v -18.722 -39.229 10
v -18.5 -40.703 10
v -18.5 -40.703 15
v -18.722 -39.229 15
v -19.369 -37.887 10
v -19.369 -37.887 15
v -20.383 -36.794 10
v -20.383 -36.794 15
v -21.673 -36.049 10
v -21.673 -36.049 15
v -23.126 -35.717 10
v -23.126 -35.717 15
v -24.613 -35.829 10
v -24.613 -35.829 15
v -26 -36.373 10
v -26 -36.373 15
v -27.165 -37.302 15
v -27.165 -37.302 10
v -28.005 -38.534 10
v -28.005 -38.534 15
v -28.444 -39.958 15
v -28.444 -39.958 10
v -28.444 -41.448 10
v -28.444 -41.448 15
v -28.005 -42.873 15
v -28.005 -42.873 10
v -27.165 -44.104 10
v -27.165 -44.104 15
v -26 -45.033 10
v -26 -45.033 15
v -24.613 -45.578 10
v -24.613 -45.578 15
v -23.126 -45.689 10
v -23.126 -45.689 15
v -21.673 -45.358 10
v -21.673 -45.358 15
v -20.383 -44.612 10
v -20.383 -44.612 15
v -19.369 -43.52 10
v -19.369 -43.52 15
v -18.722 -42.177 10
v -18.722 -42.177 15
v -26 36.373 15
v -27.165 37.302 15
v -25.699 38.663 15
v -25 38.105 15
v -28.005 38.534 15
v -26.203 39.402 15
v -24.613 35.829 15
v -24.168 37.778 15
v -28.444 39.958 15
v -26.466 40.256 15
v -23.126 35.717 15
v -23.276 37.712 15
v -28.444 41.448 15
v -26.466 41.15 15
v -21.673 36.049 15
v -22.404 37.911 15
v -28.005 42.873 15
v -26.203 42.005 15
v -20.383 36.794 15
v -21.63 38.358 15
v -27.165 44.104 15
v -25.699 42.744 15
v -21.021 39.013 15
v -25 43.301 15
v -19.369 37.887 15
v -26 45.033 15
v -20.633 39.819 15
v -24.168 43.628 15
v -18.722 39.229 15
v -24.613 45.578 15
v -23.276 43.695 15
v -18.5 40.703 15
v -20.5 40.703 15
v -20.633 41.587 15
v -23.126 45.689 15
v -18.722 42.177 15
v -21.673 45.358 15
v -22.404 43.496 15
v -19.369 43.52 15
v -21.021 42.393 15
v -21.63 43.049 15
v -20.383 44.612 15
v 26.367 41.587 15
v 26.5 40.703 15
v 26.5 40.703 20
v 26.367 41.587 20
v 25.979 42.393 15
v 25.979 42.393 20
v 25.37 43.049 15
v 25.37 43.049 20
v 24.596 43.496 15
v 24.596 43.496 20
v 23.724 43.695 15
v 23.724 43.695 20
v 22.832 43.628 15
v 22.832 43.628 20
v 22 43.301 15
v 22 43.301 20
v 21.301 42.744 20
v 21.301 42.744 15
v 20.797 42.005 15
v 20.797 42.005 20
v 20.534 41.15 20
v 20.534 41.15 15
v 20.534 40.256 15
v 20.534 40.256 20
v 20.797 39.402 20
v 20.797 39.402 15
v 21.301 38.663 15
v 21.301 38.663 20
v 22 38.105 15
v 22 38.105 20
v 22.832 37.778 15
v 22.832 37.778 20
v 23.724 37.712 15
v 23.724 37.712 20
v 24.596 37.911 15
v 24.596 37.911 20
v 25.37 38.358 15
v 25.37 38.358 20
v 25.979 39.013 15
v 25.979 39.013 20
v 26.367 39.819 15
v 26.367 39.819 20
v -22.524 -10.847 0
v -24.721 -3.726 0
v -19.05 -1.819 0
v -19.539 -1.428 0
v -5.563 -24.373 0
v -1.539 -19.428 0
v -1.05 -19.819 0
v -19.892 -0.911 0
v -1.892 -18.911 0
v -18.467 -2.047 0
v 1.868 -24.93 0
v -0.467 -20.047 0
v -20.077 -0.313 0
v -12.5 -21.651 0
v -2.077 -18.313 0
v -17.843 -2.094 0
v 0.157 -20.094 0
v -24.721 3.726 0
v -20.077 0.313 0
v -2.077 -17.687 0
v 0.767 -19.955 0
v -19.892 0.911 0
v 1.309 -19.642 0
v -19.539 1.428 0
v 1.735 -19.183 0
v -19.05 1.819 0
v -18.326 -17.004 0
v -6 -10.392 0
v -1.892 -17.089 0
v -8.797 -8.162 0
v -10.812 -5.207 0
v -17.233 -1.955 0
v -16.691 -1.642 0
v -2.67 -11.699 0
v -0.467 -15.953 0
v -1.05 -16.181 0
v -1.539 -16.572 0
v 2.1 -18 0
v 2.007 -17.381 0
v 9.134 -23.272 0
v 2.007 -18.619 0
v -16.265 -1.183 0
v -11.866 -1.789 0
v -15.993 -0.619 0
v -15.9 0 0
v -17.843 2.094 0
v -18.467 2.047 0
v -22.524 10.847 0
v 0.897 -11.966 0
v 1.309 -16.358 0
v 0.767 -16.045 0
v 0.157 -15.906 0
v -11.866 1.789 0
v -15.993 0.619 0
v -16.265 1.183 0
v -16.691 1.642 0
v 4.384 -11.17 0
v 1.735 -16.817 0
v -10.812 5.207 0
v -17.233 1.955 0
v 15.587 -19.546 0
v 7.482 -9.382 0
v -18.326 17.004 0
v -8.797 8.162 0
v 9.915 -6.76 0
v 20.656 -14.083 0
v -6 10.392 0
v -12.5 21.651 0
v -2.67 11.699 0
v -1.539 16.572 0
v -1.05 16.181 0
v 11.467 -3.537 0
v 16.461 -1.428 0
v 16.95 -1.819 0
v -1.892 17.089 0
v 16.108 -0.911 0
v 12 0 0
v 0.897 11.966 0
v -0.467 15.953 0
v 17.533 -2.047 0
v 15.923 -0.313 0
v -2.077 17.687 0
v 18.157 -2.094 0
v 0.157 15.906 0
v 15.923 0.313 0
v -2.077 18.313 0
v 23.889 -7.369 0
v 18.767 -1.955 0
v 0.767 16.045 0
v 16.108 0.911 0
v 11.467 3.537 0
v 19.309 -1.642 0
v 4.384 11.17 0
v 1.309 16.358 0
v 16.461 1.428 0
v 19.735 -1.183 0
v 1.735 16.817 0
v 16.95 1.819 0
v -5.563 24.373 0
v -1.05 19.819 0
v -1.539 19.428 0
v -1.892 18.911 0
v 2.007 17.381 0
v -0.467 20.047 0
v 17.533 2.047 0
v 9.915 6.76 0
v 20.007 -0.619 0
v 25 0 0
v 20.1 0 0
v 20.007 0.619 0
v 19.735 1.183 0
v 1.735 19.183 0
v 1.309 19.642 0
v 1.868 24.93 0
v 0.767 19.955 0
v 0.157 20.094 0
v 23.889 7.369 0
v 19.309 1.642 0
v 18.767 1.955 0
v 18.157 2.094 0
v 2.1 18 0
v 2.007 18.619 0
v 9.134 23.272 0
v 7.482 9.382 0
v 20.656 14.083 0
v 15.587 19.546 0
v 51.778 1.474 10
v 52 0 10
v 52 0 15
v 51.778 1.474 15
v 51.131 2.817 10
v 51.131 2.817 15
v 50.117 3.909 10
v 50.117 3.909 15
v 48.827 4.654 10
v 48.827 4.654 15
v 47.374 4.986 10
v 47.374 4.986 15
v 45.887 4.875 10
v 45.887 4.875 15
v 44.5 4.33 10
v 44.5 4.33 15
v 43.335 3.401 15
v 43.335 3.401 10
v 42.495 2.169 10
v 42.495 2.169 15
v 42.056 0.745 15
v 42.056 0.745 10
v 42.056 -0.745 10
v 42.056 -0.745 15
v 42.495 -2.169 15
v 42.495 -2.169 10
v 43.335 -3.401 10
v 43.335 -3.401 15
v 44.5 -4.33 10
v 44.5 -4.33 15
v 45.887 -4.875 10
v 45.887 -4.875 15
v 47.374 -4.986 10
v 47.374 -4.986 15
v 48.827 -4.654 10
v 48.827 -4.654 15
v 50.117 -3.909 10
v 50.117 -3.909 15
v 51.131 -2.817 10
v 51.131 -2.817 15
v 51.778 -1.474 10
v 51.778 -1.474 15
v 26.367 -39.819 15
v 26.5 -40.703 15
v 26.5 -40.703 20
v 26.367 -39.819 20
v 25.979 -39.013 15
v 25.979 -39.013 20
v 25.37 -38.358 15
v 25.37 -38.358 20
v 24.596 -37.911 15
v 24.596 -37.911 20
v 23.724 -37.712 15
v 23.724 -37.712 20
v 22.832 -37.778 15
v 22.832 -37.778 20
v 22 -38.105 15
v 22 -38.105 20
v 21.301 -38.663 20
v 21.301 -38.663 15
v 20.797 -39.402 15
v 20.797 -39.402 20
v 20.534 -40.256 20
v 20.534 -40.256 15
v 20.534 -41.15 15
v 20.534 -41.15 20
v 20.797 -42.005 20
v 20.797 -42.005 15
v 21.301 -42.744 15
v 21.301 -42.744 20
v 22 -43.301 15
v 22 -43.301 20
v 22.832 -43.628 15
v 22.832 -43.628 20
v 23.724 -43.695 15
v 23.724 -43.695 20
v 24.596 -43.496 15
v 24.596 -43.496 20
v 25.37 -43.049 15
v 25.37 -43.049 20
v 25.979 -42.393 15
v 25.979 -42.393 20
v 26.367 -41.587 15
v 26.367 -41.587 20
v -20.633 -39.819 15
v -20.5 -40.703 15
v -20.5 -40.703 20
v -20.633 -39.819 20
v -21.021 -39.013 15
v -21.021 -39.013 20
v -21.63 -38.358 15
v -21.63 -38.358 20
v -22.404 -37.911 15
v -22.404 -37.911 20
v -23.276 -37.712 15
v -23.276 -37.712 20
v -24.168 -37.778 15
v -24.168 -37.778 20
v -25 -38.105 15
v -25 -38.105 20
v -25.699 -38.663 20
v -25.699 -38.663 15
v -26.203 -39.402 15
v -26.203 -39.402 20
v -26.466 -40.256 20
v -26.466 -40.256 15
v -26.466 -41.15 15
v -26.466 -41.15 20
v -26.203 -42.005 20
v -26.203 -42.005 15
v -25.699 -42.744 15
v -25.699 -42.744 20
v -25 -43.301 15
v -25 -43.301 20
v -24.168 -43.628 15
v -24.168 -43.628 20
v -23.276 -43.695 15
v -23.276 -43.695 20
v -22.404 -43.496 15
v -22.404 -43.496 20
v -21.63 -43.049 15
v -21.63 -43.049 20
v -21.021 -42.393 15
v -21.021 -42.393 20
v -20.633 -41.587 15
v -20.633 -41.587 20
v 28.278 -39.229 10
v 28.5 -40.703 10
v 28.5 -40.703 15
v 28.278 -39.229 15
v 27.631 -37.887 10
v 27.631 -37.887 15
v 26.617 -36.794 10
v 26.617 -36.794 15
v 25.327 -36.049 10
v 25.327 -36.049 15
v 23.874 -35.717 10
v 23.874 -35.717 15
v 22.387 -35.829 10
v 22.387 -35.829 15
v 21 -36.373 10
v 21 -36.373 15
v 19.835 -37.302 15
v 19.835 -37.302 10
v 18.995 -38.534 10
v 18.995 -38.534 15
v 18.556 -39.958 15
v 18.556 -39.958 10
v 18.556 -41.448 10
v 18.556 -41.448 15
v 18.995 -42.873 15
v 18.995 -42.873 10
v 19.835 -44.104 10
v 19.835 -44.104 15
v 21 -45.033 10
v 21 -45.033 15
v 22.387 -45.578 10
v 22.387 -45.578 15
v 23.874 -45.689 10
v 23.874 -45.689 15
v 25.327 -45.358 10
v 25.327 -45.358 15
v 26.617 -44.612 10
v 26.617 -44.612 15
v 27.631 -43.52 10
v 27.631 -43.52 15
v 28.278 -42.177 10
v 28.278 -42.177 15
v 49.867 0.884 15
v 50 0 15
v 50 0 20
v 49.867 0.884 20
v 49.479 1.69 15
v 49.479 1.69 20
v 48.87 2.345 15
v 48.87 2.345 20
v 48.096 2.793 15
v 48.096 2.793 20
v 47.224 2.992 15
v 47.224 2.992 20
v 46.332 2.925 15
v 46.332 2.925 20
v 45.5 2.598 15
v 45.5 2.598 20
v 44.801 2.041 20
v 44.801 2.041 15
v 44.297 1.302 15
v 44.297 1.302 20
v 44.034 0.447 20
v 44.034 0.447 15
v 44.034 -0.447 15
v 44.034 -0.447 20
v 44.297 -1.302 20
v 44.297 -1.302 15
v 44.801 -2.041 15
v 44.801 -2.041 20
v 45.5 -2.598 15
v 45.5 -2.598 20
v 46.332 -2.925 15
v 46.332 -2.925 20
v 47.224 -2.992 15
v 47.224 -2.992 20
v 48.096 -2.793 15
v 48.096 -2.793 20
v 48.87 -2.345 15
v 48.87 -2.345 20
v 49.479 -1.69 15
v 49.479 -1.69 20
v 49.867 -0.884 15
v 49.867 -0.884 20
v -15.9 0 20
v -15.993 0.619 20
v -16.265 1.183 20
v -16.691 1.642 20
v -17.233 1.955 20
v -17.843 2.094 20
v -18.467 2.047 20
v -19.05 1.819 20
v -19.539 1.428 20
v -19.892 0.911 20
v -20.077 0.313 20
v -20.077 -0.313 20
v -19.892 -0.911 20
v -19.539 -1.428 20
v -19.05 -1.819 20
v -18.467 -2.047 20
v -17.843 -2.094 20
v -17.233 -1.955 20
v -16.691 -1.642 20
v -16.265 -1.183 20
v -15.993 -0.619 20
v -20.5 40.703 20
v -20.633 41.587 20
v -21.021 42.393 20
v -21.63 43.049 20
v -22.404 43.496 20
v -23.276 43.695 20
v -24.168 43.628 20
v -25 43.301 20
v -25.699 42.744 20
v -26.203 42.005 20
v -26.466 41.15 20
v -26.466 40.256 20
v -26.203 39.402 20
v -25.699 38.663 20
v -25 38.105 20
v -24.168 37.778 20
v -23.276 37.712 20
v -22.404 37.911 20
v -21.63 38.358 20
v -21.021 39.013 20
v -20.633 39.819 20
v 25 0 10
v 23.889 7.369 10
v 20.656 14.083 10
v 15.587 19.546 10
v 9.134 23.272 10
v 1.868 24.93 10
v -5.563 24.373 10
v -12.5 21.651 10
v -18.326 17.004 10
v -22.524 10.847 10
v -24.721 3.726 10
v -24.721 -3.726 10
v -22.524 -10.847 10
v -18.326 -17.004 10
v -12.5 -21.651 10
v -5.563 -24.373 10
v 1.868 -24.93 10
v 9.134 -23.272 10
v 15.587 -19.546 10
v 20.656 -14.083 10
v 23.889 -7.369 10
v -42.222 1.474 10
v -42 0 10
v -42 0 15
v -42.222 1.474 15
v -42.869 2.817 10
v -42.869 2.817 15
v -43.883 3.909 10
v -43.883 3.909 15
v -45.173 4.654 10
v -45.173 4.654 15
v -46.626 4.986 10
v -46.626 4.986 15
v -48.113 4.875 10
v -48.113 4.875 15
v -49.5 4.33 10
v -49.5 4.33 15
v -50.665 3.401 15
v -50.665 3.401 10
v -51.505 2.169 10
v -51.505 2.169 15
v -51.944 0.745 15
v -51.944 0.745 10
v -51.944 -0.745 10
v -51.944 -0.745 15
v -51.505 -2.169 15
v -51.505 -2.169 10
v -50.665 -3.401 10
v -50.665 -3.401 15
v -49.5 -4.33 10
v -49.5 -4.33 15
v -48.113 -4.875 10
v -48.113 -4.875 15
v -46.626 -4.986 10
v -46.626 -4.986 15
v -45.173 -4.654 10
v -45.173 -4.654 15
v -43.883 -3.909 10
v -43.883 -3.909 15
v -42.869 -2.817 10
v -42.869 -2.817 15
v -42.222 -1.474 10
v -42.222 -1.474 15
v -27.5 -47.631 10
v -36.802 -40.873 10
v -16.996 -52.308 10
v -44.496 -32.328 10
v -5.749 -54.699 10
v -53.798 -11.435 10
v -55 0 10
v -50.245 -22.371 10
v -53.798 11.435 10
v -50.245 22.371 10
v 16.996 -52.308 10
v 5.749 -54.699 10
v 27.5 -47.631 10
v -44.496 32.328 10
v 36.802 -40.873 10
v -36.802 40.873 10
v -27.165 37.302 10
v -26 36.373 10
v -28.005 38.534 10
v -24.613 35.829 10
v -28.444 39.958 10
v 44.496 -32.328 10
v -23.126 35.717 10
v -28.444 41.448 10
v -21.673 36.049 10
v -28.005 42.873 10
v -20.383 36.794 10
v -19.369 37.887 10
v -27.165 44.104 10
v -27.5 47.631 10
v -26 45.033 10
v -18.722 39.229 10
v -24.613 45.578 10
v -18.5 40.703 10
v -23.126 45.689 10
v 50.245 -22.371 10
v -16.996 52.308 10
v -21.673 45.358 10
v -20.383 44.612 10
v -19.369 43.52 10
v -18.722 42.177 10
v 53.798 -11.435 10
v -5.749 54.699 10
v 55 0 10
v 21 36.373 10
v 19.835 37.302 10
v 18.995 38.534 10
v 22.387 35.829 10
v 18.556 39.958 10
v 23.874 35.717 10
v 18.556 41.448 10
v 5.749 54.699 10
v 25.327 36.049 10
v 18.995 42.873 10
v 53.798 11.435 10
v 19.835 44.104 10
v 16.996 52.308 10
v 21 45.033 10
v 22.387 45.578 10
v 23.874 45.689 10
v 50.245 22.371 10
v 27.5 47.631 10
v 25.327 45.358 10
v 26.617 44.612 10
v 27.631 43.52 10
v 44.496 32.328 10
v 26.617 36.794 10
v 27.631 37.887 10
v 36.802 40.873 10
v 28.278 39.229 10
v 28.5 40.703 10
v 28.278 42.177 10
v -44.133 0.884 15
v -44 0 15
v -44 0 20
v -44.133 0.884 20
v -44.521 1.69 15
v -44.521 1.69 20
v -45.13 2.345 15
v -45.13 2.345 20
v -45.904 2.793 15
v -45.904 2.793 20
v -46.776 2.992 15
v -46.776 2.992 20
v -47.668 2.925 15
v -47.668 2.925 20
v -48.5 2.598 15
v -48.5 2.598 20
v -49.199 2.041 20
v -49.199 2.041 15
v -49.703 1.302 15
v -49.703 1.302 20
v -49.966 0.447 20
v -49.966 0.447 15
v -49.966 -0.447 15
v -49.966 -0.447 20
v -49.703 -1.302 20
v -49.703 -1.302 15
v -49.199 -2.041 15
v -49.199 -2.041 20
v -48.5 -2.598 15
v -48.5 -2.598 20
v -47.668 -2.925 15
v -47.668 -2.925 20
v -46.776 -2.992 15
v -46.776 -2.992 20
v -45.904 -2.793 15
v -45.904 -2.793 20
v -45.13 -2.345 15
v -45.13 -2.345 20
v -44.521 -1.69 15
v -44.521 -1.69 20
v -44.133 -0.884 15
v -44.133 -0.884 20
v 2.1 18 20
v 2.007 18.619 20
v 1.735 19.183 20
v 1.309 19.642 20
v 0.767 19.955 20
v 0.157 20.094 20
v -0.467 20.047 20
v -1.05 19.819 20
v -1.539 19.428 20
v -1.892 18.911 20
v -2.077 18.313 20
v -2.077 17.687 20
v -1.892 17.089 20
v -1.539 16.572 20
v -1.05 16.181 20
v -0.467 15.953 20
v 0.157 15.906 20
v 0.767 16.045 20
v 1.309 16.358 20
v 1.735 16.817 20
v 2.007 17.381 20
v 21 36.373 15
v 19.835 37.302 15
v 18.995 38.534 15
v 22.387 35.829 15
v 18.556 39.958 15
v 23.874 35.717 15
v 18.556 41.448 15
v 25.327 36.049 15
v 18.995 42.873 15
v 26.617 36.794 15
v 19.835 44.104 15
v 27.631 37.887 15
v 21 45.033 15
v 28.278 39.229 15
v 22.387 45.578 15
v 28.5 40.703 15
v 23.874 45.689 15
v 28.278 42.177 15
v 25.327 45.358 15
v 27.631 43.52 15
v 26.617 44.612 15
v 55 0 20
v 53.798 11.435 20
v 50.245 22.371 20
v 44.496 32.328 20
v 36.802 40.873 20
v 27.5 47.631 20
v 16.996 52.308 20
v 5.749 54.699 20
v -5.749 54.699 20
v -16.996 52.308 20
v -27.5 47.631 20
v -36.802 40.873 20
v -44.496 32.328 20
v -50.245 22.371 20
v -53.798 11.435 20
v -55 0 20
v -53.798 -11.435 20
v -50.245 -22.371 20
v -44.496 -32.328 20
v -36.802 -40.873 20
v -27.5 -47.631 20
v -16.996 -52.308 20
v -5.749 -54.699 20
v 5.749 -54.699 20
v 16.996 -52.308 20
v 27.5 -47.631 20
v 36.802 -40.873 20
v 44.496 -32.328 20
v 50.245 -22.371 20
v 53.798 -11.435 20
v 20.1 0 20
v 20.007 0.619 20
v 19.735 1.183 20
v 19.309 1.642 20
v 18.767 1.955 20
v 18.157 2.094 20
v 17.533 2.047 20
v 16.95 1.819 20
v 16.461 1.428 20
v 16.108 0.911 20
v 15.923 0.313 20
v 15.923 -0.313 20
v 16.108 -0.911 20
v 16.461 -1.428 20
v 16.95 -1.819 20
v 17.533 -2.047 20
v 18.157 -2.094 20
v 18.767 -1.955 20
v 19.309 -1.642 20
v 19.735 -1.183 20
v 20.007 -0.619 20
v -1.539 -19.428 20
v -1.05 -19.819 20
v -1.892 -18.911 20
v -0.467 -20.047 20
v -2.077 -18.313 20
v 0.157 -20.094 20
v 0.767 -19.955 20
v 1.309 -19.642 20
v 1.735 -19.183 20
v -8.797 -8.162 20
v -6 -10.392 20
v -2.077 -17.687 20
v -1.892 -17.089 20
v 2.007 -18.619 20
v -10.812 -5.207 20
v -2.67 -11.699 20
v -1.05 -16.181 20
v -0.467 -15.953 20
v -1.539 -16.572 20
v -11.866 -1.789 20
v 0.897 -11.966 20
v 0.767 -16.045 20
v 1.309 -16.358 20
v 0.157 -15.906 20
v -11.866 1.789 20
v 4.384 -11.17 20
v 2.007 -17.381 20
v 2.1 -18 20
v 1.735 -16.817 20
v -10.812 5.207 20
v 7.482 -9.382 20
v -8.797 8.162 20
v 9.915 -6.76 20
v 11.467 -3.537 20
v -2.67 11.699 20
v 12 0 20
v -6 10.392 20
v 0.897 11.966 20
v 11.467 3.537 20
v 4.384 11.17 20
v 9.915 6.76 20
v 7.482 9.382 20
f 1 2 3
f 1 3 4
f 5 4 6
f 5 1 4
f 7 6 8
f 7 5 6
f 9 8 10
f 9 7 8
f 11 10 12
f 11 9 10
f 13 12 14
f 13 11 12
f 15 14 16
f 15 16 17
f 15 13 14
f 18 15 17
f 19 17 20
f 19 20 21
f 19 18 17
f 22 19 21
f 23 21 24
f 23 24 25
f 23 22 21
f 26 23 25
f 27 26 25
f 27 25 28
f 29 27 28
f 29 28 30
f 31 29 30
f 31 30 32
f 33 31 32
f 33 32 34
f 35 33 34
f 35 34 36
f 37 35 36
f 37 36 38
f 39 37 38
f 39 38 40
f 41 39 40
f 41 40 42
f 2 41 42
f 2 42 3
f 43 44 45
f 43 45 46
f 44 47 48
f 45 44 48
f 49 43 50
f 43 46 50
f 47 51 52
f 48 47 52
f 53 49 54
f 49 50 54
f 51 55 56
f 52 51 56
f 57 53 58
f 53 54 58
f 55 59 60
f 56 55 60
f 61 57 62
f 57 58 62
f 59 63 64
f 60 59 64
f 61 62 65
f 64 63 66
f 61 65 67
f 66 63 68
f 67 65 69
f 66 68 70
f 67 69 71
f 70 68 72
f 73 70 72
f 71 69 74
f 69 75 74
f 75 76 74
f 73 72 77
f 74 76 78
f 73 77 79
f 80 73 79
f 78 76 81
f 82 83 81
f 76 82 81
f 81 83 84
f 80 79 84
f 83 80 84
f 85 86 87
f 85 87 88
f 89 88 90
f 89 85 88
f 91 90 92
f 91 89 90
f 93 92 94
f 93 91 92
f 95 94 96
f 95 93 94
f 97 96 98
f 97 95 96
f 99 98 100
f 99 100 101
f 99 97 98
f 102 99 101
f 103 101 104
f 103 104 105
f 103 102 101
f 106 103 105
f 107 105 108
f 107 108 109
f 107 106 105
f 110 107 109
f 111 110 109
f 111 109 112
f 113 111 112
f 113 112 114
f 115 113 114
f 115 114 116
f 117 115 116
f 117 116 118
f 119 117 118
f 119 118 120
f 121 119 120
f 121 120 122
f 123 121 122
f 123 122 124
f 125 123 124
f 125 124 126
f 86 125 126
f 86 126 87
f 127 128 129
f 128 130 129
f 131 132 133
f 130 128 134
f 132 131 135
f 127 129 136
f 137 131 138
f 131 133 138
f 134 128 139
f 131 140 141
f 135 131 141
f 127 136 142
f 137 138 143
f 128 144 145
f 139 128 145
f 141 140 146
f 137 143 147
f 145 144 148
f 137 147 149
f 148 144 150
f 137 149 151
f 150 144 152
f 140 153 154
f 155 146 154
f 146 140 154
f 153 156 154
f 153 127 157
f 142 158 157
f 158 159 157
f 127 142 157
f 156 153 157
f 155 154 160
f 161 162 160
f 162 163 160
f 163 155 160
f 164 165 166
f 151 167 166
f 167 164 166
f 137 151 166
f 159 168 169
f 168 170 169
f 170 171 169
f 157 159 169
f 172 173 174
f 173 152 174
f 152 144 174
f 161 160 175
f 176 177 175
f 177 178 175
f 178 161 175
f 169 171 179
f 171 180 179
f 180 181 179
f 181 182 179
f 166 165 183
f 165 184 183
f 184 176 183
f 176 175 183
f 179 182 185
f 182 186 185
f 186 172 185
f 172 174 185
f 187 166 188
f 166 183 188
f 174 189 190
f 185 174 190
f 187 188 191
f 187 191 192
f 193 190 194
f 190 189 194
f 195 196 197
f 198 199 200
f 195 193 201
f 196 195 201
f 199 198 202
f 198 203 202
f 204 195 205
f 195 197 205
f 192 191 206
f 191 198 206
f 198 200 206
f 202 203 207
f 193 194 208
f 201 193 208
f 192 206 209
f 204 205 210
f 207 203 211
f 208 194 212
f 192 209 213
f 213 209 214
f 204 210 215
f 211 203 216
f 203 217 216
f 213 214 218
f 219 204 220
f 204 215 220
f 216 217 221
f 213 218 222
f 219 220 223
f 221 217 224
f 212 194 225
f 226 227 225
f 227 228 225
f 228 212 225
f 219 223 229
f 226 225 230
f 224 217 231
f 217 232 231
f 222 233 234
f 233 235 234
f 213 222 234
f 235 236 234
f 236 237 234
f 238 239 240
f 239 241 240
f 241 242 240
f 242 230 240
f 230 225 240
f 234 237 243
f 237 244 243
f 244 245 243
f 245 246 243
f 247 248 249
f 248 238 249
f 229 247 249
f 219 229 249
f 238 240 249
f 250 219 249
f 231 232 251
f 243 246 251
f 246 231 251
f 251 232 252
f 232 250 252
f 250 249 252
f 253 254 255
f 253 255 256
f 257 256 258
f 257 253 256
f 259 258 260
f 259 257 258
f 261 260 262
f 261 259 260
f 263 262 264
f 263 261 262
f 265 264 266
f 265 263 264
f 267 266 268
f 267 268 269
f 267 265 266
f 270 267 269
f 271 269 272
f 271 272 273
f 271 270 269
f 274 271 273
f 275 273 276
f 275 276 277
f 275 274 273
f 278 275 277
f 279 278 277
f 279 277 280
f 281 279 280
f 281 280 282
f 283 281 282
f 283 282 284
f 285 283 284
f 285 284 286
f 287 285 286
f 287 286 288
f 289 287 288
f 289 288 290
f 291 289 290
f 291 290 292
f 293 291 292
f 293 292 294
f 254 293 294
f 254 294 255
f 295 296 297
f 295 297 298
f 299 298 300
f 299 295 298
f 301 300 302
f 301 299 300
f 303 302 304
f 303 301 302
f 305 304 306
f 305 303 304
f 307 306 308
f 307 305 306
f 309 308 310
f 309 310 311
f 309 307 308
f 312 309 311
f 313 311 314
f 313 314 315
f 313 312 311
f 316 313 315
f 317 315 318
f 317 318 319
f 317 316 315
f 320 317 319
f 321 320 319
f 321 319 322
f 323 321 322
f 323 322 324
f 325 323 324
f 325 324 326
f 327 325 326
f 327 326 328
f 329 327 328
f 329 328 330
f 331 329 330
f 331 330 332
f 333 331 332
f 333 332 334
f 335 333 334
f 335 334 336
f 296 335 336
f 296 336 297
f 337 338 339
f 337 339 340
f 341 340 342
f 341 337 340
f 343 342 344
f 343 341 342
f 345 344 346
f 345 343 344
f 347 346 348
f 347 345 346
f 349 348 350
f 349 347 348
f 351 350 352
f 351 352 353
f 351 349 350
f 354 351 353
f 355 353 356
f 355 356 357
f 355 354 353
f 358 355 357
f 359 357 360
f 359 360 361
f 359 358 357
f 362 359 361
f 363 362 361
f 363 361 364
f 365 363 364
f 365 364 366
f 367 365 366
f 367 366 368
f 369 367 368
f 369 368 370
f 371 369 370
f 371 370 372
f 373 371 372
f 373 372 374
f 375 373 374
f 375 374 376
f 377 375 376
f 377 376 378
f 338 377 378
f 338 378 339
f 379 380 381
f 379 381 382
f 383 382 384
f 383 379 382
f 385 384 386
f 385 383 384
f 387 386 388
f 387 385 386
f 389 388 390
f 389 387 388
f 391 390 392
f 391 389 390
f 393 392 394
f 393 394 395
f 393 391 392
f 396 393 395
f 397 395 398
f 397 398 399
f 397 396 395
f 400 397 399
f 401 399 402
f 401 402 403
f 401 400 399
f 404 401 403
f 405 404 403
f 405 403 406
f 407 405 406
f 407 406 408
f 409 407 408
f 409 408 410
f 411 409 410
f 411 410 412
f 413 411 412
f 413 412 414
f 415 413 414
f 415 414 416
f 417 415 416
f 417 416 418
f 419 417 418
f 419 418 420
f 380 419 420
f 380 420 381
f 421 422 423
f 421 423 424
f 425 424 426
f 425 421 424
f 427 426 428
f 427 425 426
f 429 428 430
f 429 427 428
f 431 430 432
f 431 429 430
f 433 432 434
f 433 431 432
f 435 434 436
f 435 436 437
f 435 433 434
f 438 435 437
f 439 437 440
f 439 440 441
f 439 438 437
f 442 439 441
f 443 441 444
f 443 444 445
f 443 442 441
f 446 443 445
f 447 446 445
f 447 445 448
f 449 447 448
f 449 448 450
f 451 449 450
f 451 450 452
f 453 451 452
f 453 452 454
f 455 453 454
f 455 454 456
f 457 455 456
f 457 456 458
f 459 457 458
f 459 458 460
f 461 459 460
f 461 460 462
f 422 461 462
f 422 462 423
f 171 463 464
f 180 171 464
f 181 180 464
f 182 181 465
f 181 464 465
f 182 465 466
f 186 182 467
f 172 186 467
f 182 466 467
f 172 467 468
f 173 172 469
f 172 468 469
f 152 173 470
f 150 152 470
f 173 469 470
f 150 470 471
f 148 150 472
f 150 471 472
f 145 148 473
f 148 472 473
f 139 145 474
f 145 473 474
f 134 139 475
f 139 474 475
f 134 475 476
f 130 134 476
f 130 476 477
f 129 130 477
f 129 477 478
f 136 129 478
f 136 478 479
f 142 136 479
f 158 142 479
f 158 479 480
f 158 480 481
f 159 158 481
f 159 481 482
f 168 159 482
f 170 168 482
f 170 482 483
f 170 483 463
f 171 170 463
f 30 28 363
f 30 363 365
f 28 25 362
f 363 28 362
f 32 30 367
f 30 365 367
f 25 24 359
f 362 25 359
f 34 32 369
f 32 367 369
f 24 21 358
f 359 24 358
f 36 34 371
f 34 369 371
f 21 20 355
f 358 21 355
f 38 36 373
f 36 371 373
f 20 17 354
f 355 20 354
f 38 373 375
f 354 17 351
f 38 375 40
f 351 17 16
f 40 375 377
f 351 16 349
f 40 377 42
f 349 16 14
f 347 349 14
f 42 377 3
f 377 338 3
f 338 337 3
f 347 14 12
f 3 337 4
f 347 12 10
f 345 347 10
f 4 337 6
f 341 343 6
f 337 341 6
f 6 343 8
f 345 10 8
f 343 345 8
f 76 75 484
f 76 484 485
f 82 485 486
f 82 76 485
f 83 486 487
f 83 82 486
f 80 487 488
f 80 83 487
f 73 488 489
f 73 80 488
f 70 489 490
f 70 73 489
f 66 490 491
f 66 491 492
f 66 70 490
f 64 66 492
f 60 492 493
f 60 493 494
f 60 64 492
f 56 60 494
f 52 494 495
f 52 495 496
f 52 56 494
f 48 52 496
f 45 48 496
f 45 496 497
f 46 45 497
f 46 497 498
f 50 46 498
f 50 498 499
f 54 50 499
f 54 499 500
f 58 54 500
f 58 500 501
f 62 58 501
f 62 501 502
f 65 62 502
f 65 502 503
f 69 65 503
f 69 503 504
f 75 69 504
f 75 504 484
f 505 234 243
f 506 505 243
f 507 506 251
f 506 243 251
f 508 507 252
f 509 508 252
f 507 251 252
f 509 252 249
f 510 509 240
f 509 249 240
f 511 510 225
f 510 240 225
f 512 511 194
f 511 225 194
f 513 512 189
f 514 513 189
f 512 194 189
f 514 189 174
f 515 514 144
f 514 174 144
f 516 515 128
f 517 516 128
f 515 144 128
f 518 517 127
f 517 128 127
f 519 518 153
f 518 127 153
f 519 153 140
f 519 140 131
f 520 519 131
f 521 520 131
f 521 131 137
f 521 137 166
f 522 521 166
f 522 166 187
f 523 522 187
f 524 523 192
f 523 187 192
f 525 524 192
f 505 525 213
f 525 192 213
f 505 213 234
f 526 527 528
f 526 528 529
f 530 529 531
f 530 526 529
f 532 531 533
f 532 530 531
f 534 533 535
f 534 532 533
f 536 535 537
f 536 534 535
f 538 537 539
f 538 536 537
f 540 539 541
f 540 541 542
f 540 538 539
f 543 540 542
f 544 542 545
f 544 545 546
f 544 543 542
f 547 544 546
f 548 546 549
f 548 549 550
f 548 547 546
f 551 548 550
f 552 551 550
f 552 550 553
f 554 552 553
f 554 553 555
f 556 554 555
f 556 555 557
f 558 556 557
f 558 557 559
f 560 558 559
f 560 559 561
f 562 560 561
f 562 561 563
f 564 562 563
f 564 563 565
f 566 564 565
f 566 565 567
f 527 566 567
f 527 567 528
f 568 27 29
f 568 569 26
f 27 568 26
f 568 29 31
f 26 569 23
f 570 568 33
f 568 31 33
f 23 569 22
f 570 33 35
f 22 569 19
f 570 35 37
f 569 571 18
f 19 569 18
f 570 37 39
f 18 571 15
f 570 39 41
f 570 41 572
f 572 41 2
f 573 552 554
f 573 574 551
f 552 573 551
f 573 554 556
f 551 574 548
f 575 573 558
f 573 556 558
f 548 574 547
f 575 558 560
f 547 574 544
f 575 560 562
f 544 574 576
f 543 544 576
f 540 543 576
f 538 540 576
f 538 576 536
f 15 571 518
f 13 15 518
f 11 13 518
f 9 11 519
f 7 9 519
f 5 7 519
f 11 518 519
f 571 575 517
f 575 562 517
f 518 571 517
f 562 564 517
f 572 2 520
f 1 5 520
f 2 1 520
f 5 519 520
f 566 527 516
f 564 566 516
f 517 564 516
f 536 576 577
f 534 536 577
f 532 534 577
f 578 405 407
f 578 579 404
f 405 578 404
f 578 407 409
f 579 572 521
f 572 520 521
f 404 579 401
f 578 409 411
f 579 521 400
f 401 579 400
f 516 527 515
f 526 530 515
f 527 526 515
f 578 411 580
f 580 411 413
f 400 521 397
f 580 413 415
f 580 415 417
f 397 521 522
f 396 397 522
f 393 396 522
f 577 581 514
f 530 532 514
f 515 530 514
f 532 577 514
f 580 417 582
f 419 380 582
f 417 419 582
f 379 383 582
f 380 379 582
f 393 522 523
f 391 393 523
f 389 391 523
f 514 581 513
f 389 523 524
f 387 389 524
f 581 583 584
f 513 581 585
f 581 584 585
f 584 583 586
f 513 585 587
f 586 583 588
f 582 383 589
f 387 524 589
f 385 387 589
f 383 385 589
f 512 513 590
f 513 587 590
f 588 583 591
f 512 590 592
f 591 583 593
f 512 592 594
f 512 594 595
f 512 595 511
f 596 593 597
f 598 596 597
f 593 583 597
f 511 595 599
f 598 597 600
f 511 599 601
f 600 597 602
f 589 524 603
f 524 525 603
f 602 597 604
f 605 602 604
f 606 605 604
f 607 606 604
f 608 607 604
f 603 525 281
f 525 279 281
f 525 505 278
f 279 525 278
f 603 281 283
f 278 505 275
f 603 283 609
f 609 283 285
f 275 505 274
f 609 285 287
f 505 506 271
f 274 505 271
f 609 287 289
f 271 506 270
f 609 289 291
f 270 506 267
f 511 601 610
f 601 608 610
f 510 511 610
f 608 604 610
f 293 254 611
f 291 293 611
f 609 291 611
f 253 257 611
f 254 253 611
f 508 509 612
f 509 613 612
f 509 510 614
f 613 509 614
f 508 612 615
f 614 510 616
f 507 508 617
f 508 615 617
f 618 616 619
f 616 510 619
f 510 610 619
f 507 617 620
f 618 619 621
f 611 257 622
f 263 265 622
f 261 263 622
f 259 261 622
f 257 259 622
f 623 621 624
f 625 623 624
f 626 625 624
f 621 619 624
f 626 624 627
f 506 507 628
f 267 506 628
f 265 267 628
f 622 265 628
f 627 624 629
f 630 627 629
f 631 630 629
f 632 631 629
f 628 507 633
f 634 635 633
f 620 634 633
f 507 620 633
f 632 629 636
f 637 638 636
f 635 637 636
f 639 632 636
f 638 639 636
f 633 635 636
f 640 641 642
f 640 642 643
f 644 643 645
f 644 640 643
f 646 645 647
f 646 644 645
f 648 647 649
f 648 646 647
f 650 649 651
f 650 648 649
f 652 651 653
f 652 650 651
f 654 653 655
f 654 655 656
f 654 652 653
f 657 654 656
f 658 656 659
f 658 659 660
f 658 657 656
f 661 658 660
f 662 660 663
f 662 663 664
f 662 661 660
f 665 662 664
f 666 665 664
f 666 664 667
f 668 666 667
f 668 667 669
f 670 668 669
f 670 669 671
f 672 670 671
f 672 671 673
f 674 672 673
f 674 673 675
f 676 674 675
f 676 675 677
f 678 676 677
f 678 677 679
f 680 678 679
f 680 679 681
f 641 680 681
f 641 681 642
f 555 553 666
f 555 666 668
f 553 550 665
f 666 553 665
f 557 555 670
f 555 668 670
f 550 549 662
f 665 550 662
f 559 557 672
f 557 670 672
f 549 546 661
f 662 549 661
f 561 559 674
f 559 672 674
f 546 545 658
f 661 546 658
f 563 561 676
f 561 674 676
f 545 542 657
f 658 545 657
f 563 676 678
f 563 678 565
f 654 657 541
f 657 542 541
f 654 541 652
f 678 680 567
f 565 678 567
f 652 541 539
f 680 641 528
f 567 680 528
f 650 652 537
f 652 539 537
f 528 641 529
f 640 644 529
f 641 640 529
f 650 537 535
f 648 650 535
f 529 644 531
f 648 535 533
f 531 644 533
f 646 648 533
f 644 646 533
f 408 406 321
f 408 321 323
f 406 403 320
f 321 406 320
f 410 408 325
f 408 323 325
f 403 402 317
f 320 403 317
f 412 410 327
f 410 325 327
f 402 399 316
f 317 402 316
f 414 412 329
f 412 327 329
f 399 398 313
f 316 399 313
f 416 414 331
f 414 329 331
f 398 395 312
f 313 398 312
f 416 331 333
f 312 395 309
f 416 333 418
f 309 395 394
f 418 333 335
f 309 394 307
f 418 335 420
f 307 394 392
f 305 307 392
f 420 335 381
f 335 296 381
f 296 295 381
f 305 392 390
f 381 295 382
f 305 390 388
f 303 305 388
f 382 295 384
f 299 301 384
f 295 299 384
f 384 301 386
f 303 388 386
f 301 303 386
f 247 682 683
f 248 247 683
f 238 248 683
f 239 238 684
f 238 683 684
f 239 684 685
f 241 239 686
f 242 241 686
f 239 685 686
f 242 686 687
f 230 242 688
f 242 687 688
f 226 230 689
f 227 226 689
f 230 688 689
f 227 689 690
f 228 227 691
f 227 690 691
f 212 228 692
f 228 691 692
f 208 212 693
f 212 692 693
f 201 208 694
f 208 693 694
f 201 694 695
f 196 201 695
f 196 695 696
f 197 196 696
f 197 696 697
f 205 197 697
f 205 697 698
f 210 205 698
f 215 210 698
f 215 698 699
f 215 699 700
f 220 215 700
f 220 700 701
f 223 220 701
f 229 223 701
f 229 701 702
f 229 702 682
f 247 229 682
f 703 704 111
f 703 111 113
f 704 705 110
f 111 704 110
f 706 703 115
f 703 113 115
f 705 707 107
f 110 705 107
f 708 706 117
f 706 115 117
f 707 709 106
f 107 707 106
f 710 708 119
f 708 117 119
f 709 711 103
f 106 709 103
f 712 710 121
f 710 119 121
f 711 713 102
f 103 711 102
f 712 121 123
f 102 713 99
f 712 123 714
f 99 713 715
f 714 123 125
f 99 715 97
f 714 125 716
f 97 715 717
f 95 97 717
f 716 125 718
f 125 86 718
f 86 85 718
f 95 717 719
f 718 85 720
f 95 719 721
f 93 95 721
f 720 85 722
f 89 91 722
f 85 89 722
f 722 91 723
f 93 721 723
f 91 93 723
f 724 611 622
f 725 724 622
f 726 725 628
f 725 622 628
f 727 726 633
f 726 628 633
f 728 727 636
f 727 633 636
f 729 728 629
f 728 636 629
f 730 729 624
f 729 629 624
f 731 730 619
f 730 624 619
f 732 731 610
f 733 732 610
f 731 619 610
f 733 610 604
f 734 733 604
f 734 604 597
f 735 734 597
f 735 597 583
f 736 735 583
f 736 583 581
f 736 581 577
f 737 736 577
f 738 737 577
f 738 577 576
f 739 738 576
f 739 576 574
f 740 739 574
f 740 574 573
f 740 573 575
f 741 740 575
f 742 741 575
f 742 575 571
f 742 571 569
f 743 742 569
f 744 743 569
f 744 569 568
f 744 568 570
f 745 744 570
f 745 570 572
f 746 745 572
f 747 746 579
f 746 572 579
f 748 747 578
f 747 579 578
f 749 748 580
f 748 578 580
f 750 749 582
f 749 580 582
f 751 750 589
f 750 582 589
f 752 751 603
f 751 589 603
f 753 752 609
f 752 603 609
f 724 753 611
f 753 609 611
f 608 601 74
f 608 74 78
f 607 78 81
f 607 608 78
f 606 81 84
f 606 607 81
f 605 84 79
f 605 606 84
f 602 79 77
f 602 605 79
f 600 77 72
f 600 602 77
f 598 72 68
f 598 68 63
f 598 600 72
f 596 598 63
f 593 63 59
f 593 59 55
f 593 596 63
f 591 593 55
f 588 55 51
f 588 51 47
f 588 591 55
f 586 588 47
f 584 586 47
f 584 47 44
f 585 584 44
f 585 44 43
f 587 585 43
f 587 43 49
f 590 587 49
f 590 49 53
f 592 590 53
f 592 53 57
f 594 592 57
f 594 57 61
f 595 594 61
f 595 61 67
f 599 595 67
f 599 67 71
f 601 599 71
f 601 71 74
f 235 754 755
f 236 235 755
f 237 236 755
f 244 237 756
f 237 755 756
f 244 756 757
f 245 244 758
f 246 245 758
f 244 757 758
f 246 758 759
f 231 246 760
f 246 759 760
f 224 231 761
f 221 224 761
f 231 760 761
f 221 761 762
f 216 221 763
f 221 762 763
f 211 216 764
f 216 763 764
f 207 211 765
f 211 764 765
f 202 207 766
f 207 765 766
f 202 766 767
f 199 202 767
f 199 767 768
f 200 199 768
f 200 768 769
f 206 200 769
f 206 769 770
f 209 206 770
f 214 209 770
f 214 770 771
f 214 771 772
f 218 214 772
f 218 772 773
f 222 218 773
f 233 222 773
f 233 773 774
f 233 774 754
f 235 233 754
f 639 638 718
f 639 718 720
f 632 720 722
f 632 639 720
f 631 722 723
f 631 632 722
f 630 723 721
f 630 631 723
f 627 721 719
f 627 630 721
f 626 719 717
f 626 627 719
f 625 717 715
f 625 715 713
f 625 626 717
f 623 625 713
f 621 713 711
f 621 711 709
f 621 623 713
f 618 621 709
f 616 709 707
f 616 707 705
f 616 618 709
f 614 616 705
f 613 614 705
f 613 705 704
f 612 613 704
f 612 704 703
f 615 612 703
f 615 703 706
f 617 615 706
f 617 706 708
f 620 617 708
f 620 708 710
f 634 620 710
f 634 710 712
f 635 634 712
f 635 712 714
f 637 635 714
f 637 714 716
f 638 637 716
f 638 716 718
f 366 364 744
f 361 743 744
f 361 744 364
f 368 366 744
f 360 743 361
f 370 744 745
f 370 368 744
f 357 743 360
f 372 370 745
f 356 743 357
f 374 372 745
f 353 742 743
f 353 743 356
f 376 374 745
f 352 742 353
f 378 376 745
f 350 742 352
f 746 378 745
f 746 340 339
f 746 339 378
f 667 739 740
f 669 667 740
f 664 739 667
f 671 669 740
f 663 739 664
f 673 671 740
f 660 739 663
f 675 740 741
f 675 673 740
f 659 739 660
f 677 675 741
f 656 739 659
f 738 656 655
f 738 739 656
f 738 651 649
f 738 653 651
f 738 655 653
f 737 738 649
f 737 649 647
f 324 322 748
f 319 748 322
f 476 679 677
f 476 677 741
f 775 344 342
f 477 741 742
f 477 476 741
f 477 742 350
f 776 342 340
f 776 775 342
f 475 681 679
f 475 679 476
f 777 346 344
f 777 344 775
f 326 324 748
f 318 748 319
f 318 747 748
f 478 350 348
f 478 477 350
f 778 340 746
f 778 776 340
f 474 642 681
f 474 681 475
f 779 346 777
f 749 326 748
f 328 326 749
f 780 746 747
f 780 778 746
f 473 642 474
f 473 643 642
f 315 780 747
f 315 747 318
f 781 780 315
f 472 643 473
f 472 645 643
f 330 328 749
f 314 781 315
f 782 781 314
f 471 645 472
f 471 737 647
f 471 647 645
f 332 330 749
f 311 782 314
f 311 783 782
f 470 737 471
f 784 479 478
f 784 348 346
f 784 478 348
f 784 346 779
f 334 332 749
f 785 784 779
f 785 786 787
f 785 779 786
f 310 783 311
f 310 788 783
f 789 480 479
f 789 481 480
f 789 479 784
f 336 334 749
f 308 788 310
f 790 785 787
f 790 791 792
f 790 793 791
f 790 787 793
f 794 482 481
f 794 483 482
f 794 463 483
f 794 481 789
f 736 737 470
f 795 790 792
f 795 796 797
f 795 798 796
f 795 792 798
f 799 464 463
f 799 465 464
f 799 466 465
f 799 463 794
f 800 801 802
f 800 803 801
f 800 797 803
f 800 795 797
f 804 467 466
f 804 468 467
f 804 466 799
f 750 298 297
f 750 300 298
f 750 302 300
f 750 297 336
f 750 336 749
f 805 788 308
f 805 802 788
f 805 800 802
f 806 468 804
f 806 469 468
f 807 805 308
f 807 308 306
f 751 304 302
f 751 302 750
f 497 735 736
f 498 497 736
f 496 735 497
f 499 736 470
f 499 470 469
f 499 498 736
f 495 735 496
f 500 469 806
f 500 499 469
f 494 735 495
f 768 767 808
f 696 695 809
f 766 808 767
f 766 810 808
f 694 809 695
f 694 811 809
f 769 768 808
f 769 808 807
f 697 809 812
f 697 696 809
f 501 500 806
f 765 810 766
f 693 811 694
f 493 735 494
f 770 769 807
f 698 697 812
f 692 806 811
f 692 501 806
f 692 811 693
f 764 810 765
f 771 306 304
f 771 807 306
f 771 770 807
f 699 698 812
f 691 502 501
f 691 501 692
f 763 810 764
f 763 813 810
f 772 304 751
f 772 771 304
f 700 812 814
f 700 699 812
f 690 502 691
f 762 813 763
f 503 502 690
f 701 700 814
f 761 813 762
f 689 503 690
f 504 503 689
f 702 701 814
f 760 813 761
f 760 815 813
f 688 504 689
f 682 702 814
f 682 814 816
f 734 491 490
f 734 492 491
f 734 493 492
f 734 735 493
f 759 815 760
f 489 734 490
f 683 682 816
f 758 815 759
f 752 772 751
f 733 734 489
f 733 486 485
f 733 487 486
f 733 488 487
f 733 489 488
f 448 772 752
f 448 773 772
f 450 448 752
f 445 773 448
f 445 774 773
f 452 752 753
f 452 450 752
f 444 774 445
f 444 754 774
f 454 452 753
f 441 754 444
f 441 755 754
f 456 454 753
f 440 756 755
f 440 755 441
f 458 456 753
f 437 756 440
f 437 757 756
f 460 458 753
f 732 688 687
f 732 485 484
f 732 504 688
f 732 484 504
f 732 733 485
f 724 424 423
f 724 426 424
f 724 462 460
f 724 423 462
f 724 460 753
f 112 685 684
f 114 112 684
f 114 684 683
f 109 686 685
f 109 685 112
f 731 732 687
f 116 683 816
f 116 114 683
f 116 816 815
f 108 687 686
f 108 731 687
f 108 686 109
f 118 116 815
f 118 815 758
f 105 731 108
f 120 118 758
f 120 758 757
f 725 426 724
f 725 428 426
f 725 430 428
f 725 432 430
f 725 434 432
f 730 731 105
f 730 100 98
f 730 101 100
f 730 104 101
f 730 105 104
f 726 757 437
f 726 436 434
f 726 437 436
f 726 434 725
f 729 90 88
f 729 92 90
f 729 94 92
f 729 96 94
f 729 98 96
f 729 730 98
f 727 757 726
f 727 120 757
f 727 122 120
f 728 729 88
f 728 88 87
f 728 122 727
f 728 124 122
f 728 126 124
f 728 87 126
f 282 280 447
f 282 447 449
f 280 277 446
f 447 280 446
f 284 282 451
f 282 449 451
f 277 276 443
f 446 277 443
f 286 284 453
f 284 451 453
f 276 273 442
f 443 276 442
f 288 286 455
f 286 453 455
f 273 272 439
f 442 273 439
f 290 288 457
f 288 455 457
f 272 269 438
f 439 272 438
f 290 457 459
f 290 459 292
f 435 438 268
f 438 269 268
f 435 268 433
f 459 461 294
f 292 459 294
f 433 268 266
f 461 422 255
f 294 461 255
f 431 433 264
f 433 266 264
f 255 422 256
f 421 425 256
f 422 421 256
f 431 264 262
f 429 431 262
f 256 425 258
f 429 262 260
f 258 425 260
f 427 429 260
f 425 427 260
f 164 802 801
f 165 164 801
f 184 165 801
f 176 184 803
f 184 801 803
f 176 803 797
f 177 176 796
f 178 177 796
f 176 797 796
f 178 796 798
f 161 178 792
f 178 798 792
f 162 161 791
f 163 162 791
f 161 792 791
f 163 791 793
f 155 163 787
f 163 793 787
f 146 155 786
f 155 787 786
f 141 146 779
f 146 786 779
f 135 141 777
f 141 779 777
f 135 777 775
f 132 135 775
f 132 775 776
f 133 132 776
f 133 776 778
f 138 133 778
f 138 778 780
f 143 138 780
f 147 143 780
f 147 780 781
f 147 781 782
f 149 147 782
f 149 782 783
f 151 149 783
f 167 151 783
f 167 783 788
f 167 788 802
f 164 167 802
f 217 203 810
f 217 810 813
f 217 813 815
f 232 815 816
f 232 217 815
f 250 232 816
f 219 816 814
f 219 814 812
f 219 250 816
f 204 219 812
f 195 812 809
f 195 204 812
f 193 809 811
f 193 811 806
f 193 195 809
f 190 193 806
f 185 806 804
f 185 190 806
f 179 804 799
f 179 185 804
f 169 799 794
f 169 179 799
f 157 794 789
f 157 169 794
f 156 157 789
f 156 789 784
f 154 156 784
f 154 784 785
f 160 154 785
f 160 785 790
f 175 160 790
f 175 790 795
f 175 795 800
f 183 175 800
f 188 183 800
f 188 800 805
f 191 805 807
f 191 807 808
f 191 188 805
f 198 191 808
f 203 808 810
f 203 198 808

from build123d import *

# Parameters (mm, degrees)
SKETCH_1_R          = 55
SKETCH_1_R_2        = 12
SKETCH_1_R_3        = 3
EXTRUDE_1_DEPTH     = 20
SKETCH_2_OUTSIDE_W  = 143.368
SKETCH_2_OUTSIDE_H  = 143.368
SKETCH_2_OUTSIDE_R  = 25
CUT_EXTRUDE_1_DEPTH = 10
SKETCH_4_R          = 5
CUT_EXTRUDE_2_DEPTH = 15
HOLE_WIZARD_M5_1_D  = 4.2


with BuildPart() as part:
    # 草图1 → 凸台-拉伸1 (new body)
    with BuildSketch(Plane.XY):
        Circle(SKETCH_1_R)
        Circle(SKETCH_1_R_2, mode=Mode.SUBTRACT)
        with Locations((47, 0)):
            Circle(SKETCH_1_R_3, mode=Mode.SUBTRACT)
        with Locations((23.5, -40.703193978)):
            Circle(SKETCH_1_R_3, mode=Mode.SUBTRACT)
        with Locations((-23.5, -40.703193978)):
            Circle(SKETCH_1_R_3, mode=Mode.SUBTRACT)
        with Locations((-47, 0)):
            Circle(SKETCH_1_R_3, mode=Mode.SUBTRACT)
        with Locations((-23.5, 40.703193978)):
            Circle(SKETCH_1_R_3, mode=Mode.SUBTRACT)
        with Locations((23.5, 40.703193978)):
            Circle(SKETCH_1_R_3, mode=Mode.SUBTRACT)
    extrude(amount=EXTRUDE_1_DEPTH)

    # 草图2 outside → 切除-拉伸1 (cut)
    with BuildSketch(Plane.XY):
        Rectangle(SKETCH_2_OUTSIDE_W, SKETCH_2_OUTSIDE_H)
        Circle(SKETCH_2_OUTSIDE_R, mode=Mode.SUBTRACT)
    extrude(amount=CUT_EXTRUDE_1_DEPTH, mode=Mode.SUBTRACT)

    # 草图4 → 切除-拉伸2 (cut)
    with BuildSketch(Plane.XY):
        with Locations((-47, 0)):
            Circle(SKETCH_4_R)
        with Locations((-23.5, 40.703193978)):
            Circle(SKETCH_4_R)
        with Locations((23.5, 40.703193978)):
            Circle(SKETCH_4_R)
        with Locations((47, 0)):
            Circle(SKETCH_4_R)
        with Locations((23.5, -40.703193978)):
            Circle(SKETCH_4_R)
        with Locations((-23.5, -40.703193978)):
            Circle(SKETCH_4_R)
    extrude(amount=CUT_EXTRUDE_2_DEPTH, mode=Mode.SUBTRACT)

    # M5 螺纹孔的螺纹孔钻头1 (through all)
    with Locations(Plane(origin=(0, 0, 0), x_dir=(-1, 0, 0), z_dir=(0, 0, -1))):
        with Locations((0, 18), (18, 0), (0, -18), (-18, 0)):
            Hole(HOLE_WIZARD_M5_1_D / 2)


solid = part.part
